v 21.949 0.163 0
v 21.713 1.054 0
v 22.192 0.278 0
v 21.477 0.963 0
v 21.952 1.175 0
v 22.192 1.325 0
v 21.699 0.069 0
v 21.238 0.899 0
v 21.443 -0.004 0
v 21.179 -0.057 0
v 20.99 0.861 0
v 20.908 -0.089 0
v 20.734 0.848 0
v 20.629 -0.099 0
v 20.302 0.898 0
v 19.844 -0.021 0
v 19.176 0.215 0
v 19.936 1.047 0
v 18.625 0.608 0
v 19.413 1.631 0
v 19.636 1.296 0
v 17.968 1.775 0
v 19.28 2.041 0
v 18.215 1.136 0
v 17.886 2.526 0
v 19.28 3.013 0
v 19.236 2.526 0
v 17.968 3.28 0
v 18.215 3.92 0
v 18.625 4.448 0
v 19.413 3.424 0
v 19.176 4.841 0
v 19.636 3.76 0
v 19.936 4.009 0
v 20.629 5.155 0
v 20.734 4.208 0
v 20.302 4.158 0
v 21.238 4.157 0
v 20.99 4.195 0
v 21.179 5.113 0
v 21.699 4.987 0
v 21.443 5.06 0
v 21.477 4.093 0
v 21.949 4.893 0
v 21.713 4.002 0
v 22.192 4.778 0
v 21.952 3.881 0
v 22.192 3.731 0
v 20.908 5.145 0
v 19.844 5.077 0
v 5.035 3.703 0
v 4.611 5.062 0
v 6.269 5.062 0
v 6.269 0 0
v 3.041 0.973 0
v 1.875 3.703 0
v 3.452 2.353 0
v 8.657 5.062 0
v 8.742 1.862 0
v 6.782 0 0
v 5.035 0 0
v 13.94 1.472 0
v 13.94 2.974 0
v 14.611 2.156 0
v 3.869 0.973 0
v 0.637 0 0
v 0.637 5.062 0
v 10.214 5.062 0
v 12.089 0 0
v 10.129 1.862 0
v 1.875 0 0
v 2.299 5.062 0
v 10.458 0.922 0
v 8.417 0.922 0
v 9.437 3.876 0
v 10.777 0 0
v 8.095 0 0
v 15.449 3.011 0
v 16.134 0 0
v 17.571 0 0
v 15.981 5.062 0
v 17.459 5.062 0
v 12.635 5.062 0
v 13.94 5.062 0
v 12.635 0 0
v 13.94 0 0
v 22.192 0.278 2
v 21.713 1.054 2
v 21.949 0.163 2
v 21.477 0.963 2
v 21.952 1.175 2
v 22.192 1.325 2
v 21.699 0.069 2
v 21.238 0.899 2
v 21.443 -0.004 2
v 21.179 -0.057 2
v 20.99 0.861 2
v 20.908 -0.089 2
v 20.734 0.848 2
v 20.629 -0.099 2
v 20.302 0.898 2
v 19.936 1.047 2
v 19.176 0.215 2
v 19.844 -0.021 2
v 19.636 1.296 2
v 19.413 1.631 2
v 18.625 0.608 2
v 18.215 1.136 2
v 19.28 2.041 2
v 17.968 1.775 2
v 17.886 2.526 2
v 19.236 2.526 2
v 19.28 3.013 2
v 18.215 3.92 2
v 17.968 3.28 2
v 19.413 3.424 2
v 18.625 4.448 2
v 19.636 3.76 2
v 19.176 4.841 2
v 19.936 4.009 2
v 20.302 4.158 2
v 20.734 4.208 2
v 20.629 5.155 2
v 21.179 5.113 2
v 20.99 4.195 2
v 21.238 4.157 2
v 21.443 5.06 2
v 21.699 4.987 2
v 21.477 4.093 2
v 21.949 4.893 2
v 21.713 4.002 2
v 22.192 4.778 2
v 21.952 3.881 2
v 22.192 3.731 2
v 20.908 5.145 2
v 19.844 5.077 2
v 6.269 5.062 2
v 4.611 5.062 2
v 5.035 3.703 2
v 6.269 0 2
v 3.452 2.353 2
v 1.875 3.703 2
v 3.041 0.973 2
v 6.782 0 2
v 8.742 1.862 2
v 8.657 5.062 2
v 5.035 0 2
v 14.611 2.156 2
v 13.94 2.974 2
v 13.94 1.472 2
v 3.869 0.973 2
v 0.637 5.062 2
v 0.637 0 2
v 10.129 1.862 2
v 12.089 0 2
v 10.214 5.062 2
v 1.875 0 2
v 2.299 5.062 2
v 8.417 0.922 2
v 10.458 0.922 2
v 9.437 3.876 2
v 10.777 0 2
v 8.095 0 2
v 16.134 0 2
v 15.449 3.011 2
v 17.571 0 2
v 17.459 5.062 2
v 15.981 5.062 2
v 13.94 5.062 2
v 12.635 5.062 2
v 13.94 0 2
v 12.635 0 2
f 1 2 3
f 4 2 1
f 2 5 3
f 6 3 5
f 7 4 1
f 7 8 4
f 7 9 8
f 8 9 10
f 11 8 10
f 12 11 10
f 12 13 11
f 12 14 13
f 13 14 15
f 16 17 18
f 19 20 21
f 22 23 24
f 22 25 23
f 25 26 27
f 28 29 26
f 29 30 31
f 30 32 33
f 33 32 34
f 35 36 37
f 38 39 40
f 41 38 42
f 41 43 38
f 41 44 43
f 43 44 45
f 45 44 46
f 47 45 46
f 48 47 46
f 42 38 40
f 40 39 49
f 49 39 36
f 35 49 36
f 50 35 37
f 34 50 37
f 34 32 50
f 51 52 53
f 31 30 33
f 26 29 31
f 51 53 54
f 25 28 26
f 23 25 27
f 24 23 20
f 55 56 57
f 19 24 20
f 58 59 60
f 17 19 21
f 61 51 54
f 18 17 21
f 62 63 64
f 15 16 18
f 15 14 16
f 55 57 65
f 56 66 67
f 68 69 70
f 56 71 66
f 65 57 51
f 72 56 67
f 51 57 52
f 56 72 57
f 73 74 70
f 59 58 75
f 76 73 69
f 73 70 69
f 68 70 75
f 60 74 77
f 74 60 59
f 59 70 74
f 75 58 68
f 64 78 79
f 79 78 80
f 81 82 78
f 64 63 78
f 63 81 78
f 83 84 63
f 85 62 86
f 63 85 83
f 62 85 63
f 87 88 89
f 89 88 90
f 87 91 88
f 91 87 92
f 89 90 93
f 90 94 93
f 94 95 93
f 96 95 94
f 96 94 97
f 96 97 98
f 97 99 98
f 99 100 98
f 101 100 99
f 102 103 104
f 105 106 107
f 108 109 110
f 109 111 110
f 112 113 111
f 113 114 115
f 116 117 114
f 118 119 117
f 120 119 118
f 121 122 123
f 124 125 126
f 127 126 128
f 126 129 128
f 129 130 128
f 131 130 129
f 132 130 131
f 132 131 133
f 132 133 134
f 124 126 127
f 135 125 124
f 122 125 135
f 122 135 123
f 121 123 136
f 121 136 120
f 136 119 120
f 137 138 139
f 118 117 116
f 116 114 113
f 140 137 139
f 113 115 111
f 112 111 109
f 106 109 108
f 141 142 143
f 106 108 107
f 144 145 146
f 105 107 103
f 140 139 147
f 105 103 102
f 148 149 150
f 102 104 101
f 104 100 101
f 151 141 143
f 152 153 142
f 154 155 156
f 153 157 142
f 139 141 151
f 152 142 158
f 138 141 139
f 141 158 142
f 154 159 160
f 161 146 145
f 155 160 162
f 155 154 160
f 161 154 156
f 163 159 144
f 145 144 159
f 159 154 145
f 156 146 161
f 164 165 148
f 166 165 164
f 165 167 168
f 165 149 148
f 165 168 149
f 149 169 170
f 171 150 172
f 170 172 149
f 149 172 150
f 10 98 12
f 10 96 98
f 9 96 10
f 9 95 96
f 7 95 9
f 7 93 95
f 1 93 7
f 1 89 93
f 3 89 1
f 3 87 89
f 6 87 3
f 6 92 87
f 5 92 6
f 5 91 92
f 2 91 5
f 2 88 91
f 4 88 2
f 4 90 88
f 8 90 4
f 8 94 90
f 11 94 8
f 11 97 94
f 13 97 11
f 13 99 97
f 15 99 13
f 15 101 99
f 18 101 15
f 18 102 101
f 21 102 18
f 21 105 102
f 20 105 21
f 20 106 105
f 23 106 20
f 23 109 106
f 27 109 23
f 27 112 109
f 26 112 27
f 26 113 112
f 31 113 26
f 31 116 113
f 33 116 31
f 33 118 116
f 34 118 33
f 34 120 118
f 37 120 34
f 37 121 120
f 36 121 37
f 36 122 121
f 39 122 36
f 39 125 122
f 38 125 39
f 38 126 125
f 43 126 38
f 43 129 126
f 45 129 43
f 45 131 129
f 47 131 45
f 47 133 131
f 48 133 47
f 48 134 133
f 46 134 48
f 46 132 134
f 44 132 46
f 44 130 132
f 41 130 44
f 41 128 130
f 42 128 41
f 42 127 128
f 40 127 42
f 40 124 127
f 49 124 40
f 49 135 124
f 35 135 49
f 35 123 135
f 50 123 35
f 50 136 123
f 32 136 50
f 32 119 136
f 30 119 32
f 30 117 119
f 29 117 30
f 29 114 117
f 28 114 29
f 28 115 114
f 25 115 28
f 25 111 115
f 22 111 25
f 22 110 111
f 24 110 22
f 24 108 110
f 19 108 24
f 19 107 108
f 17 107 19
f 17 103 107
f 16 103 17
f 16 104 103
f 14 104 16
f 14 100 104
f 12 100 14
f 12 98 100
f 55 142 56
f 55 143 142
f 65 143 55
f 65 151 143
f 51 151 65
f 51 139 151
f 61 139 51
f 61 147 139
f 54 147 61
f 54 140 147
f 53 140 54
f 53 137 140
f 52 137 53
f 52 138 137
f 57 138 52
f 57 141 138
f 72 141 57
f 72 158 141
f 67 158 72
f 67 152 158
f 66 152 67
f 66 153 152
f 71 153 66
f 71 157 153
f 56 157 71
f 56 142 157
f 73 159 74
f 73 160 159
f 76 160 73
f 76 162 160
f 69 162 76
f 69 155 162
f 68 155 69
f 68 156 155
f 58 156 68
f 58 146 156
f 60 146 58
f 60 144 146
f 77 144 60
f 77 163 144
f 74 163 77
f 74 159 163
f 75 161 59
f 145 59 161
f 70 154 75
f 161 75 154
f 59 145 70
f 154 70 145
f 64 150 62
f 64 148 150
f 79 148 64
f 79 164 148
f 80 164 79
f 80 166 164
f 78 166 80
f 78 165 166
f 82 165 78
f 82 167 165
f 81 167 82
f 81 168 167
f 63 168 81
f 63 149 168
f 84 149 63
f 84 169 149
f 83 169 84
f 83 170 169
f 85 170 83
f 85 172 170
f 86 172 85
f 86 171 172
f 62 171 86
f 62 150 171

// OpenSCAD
linear_extrude(2) text("МАКС", font="Verdana:style=Bold" ,size=5);
